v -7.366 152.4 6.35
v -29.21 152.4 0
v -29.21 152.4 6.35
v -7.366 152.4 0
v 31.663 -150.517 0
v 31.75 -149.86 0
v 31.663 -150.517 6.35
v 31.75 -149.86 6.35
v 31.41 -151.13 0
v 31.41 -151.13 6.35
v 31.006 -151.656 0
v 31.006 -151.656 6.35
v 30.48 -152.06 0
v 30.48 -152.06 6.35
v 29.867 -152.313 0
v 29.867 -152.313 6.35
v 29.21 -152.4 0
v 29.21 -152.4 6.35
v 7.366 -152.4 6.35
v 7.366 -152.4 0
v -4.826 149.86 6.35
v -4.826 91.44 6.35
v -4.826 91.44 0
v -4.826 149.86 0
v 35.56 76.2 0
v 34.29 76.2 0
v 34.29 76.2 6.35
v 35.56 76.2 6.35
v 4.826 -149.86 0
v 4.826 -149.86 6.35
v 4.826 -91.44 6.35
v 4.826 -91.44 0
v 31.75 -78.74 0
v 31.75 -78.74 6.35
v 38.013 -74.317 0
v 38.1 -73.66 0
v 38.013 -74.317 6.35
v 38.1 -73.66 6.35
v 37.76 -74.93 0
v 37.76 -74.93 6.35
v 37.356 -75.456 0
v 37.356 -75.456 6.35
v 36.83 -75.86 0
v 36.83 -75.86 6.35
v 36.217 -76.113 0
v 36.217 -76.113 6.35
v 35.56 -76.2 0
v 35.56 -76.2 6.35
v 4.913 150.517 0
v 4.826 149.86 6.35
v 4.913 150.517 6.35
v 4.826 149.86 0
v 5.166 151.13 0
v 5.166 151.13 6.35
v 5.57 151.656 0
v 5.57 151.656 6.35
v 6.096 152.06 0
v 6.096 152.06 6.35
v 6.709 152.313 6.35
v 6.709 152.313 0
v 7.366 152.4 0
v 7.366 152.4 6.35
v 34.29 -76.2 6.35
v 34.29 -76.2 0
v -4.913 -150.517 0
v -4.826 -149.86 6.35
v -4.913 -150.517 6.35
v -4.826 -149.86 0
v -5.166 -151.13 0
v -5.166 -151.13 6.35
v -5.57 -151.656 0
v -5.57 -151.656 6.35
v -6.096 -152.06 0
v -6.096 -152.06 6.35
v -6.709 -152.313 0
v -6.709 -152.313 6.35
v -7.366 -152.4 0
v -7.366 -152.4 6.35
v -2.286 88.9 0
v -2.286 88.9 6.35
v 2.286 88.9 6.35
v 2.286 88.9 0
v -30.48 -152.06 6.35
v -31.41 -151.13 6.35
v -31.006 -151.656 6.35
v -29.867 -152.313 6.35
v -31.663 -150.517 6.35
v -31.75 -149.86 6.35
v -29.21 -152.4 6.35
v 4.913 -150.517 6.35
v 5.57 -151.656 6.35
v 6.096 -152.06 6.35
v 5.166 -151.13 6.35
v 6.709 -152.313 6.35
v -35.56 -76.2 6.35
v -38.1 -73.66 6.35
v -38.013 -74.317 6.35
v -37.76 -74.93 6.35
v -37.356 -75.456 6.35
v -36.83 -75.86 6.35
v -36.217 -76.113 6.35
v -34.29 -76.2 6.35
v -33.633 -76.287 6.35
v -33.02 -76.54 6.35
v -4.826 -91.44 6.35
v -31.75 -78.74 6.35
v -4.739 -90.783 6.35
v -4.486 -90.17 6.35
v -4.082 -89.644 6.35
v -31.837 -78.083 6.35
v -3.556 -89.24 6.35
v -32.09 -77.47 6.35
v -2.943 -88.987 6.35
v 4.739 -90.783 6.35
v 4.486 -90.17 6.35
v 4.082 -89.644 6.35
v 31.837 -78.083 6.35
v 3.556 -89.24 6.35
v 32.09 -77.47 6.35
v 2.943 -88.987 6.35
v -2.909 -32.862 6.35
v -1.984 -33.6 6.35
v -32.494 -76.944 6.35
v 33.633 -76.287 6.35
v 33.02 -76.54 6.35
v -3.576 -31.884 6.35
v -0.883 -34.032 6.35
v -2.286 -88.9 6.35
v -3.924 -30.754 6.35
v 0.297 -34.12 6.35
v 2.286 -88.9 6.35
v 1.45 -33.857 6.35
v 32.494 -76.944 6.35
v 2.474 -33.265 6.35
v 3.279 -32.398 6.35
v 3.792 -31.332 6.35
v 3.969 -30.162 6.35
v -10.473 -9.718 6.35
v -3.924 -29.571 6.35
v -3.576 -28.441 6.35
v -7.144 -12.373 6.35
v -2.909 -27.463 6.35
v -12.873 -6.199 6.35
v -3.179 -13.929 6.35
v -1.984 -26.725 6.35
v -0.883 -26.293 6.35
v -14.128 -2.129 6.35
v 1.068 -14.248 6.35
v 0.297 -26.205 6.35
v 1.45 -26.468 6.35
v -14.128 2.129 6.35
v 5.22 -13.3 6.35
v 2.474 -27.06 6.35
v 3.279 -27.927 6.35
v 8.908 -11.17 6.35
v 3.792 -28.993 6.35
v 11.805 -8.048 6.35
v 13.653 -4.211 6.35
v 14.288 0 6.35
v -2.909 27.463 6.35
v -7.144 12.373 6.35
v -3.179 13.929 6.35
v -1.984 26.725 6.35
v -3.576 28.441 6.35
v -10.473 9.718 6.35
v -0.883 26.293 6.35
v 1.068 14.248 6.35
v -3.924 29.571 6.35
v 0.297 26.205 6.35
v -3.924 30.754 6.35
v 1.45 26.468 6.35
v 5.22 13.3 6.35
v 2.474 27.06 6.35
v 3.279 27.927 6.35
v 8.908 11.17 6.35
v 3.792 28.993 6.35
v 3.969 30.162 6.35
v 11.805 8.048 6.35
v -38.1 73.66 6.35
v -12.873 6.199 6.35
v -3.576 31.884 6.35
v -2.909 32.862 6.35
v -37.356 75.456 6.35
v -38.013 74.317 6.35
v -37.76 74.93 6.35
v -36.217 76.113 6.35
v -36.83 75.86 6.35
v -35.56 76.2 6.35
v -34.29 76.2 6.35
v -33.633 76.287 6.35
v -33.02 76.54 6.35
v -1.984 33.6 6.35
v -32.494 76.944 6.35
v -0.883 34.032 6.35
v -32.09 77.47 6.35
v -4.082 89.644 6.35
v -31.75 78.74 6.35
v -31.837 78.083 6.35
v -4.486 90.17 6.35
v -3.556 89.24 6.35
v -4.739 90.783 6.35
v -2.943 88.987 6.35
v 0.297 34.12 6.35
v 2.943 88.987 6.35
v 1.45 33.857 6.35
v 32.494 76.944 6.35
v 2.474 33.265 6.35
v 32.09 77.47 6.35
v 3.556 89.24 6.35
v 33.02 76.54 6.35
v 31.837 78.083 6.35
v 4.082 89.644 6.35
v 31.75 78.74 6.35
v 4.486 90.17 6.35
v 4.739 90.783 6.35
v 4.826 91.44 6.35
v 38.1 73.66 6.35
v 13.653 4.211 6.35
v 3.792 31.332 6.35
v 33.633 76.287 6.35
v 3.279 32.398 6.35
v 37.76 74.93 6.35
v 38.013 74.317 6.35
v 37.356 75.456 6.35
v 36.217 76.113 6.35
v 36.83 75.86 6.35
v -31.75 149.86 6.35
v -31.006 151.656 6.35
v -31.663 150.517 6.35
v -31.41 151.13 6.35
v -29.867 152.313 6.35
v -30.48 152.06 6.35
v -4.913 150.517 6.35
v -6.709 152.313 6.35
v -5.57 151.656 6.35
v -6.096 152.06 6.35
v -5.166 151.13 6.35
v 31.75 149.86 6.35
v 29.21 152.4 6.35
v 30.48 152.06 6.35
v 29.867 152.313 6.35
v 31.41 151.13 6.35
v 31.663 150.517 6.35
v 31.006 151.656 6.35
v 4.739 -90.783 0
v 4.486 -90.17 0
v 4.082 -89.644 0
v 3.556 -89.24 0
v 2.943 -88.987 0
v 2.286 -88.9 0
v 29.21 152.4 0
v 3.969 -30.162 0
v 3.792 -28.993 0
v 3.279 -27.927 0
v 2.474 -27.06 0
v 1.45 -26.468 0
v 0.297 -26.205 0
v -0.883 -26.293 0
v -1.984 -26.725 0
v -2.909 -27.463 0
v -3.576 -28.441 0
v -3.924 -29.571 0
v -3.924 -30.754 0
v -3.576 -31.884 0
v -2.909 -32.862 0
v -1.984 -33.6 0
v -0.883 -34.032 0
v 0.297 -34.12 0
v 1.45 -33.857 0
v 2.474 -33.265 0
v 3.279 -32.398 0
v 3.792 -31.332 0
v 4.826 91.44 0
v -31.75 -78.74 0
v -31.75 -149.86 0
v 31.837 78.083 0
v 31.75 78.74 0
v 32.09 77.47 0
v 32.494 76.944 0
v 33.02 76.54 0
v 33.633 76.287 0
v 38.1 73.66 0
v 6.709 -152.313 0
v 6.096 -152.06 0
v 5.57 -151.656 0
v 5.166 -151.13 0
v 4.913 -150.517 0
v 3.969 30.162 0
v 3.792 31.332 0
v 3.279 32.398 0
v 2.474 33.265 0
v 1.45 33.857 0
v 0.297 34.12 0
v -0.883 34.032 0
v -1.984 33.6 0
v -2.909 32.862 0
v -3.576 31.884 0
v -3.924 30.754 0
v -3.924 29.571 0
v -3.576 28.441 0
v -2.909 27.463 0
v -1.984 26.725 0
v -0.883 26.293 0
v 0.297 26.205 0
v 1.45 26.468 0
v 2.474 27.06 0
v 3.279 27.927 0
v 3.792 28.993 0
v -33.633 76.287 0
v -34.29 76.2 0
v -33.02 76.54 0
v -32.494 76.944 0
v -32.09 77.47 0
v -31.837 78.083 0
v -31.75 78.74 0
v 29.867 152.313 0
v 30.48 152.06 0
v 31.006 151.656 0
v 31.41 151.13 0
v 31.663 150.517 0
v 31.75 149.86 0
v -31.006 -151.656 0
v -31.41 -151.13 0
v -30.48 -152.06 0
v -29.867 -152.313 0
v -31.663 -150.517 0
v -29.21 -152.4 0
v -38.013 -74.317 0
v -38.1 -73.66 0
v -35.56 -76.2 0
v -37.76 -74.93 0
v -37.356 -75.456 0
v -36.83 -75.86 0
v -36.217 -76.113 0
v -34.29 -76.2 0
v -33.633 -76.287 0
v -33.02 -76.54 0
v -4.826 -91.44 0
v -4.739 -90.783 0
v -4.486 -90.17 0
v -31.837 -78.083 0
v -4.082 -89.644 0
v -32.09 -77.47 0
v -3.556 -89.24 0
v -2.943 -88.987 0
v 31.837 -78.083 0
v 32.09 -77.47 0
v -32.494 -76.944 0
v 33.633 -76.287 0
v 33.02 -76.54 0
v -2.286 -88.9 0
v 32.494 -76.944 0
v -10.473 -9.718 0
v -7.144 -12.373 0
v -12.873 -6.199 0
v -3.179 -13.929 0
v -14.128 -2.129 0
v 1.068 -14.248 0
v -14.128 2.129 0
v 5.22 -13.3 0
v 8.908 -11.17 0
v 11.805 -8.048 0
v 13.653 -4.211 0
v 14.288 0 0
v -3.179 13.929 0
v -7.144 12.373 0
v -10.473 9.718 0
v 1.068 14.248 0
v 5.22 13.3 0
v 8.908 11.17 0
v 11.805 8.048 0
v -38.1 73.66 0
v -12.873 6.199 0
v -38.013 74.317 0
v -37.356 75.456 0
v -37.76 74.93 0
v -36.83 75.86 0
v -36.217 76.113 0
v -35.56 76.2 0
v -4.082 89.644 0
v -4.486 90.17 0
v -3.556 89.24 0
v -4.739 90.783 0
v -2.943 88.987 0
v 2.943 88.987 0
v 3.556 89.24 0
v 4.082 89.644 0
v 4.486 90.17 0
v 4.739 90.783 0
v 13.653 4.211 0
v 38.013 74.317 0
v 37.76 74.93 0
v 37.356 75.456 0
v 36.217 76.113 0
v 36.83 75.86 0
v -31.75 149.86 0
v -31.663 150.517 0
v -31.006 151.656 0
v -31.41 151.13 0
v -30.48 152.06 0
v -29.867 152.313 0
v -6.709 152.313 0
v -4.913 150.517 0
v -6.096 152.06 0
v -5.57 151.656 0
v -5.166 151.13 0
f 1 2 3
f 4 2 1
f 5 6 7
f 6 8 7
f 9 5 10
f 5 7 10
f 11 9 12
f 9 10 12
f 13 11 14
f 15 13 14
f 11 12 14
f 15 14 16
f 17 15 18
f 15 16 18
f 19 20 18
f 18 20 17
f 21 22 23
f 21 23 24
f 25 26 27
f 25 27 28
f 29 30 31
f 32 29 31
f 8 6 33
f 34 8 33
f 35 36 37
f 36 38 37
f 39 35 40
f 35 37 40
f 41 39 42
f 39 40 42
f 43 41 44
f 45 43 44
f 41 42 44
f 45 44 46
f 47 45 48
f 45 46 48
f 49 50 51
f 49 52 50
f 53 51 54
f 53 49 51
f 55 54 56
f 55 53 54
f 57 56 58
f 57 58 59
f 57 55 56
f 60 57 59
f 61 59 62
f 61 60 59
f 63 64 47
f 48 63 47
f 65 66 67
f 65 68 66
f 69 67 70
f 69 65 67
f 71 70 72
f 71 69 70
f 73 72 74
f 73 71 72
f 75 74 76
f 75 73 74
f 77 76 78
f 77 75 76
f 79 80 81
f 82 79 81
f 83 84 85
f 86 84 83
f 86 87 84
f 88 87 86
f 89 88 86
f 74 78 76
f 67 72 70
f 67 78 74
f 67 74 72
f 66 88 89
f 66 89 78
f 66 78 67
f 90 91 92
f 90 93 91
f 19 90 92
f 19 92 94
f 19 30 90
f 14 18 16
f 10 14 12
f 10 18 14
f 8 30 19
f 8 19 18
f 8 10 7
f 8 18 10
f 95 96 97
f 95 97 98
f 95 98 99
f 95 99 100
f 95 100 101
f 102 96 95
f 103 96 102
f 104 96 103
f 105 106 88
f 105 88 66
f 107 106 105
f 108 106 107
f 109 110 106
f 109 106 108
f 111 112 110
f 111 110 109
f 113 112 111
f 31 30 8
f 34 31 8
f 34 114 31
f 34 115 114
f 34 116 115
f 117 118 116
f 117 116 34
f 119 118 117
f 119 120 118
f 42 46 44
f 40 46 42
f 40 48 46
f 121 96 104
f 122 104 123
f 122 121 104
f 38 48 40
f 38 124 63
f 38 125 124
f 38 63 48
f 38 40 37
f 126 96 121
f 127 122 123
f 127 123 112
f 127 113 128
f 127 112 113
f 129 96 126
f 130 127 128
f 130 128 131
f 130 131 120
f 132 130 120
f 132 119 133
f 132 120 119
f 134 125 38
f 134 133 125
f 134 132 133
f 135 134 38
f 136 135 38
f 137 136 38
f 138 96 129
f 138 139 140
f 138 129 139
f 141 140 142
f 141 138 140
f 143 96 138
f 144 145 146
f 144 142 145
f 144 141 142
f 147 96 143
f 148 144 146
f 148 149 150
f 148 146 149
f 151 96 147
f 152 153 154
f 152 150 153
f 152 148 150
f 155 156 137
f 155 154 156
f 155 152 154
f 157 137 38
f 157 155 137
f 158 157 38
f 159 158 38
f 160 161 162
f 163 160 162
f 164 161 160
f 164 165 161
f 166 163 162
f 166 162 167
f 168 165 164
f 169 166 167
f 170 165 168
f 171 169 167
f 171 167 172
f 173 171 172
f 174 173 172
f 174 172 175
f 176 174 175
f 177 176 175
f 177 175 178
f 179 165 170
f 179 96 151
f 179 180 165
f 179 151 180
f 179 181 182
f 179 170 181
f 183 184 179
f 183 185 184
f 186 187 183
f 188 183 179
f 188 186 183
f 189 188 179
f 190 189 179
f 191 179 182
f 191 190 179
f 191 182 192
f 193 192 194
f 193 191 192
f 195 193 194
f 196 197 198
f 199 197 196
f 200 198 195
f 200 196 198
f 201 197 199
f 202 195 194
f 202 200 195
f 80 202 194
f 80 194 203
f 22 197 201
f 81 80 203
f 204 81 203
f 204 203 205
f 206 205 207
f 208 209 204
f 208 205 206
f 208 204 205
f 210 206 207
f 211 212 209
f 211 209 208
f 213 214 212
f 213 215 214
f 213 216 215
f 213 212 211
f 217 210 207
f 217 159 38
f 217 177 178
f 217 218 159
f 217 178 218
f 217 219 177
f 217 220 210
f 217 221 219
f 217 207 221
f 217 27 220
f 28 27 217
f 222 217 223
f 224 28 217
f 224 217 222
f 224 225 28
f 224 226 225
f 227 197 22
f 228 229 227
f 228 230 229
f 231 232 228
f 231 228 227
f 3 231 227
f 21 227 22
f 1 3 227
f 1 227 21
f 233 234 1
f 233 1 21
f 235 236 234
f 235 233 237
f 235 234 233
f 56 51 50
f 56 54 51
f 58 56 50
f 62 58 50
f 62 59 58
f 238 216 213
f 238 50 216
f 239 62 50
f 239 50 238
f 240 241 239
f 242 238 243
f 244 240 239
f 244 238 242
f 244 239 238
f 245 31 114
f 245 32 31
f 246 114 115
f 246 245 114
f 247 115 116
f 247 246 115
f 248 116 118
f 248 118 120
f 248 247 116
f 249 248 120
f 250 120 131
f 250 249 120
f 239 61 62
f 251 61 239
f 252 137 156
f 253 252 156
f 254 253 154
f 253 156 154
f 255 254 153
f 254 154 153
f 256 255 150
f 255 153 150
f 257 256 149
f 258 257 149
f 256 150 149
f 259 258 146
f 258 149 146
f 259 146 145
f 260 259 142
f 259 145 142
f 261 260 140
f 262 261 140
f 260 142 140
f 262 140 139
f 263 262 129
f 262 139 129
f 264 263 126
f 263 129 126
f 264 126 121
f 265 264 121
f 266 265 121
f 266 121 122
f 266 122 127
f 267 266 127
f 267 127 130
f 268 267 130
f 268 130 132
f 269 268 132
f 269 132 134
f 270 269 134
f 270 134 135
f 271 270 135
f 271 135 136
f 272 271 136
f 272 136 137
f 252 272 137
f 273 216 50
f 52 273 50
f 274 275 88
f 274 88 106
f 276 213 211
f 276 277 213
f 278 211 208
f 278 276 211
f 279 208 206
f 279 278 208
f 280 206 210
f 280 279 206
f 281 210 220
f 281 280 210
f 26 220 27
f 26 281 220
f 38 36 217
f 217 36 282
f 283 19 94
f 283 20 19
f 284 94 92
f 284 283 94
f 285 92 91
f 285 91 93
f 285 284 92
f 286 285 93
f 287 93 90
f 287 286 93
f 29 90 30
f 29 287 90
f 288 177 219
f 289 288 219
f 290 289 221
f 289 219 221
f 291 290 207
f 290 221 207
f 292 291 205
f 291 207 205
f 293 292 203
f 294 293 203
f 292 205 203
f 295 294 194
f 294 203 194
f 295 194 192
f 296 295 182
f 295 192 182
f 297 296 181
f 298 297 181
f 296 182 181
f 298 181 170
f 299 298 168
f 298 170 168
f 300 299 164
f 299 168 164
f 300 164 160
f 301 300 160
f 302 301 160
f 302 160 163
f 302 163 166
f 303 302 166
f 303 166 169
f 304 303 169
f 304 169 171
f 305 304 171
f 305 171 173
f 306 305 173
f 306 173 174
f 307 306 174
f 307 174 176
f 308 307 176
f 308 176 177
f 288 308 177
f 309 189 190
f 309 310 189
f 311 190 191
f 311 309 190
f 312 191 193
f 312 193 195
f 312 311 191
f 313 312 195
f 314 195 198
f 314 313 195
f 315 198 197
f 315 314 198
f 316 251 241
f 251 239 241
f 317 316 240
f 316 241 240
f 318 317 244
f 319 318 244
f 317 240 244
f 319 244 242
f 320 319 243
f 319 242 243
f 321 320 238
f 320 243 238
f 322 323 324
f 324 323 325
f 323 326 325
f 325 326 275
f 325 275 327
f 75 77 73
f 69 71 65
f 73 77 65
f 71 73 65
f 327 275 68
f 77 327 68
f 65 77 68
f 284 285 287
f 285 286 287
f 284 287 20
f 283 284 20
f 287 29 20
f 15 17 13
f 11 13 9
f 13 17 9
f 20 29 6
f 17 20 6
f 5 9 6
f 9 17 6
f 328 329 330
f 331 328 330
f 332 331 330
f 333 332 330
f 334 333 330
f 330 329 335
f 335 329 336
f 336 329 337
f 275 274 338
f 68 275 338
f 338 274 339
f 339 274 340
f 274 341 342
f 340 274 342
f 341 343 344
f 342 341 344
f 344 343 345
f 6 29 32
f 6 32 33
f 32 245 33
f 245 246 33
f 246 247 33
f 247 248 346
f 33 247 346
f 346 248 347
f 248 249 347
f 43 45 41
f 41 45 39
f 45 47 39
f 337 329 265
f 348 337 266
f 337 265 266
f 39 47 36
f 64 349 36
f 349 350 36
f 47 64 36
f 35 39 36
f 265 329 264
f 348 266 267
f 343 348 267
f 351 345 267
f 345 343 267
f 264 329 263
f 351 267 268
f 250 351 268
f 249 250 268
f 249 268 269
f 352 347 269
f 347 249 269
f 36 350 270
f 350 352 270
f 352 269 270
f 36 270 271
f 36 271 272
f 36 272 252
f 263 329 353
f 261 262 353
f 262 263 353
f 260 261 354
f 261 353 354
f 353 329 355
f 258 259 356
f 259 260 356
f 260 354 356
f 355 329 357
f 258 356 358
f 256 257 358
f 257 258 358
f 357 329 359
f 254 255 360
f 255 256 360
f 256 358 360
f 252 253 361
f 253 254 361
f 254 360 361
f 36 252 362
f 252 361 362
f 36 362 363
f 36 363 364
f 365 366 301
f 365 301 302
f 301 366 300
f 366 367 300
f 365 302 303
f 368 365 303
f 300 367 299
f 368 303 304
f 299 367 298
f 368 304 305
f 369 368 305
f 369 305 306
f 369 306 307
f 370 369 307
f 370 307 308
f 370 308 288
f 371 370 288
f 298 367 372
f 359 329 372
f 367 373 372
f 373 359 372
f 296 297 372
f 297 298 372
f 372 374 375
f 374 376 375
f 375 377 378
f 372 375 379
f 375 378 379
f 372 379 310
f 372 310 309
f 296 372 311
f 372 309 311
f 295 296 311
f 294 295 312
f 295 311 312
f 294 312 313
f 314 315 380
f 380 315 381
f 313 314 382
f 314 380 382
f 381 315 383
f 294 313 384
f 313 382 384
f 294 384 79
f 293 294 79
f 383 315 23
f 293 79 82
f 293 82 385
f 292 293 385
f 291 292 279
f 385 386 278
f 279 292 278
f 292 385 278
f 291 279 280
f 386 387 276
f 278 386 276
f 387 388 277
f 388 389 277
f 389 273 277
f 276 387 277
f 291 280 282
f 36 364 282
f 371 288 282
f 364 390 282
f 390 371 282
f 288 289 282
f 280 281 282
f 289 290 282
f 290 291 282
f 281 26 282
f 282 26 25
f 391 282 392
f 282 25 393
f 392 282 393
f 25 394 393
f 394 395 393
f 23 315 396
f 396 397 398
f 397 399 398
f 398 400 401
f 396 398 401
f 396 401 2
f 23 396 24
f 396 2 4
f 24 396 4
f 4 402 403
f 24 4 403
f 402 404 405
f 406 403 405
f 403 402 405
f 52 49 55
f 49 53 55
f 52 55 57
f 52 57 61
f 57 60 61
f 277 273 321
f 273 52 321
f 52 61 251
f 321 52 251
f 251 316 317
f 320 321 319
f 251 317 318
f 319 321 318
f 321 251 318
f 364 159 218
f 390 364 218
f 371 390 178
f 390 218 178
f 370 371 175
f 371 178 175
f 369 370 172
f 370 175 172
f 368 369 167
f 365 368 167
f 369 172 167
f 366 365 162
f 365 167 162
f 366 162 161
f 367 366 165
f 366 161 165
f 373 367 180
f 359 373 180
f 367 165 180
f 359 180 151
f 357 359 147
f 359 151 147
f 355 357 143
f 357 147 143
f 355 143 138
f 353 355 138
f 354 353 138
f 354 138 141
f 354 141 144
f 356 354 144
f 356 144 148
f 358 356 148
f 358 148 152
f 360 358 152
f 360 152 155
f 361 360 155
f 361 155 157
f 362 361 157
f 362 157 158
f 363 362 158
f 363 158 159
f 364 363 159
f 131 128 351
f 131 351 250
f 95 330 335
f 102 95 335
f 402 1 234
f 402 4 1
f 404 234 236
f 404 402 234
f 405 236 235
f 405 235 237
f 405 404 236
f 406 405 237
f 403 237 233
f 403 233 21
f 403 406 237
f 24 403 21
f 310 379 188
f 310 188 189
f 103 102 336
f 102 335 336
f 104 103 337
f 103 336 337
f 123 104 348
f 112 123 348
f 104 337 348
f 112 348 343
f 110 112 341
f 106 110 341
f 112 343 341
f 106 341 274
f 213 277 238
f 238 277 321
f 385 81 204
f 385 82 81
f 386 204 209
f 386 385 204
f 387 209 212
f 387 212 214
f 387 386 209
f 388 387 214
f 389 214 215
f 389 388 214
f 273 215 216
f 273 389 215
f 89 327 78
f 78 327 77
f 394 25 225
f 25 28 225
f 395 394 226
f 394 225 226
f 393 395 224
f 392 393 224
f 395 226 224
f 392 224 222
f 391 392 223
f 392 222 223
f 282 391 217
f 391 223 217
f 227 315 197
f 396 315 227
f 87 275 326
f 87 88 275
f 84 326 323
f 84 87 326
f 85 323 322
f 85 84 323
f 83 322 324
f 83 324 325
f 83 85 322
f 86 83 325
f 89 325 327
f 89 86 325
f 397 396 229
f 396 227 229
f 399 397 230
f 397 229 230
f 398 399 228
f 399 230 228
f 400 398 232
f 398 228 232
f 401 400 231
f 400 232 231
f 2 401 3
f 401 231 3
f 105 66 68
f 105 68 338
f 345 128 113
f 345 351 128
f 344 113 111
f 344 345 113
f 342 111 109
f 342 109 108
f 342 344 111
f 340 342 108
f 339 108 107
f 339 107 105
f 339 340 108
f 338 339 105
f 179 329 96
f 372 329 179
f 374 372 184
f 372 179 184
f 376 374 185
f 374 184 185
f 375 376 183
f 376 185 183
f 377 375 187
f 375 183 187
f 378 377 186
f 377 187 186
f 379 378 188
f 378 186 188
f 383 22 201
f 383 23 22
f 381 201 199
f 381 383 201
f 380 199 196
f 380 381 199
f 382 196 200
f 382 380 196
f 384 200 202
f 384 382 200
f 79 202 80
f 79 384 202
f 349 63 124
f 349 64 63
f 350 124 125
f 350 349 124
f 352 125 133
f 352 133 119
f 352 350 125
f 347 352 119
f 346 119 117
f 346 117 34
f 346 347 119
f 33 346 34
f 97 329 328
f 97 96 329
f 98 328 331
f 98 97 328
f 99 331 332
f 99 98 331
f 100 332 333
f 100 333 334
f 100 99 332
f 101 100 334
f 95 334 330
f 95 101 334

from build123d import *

# Parameters (mm, degrees)
F0_W     = 63.5
F0_H     = 304.8
F1_DEPTH = 6.35
F2_W     = 76.2
F2_H     = 152.4
F3_DEPTH = 6.35
F4_W     = 9.652
F4_H     = 63.5
F4_R     = 14.2875
F4_R_2   = 3.96875
F5_DEPTH = 6.351
F6_R     = 2.54


with BuildPart() as f1:
    # F0 (on Top) → F1 (new body)
    with BuildSketch(Plane.XY):
        Rectangle(F0_W, F0_H)
    extrude(amount=F1_DEPTH)

    # F2 (on Top) → F3 (join)
    with BuildSketch(Plane.XY):
        Rectangle(F2_W, F2_H)
    extrude(amount=F3_DEPTH)

    # F4 (on face) → F5 (cut, through all)
    with BuildSketch(Plane.XY.offset(6.35)):
        with Locations((0, 120.65)):
            Rectangle(F4_W, F4_H)
        with Locations((0, -120.65)):
            Rectangle(F4_W, F4_H)
        Circle(F4_R)
        with Locations((0, 30.1625)):
            Circle(F4_R_2)
        with Locations((0, -30.1625)):
            Circle(F4_R_2)
    extrude(amount=-F5_DEPTH, mode=Mode.SUBTRACT)

    # F6
    f6_edges = [f1.edges().sort_by_distance(p)[0] for p in [
        (-38.1, 76.2, 3.175),
        (-31.75, 76.2, 3.175),
        (-31.75, 152.4, 3.175),
        (-4.826, 152.4, 3.175),
        (4.826, 152.4, 3.175),
        (4.826, 88.9, 3.175),
        (-4.826, 88.9, 3.175),
        (31.75, 152.4, 3.175),
        (31.75, 76.2, 3.175),
        (38.1, 76.2, 3.175),
        (38.1, -76.2, 3.175),
        (31.75, -76.2, 3.175),
        (31.75, -152.4, 3.175),
        (4.826, -152.4, 3.175),
        (4.826, -88.9, 3.175),
        (-4.826, -88.9, 3.175),
        (-4.826, -152.4, 3.175),
        (-31.75, -152.4, 3.175),
        (-31.75, -76.2, 3.175),
        (-38.1, -76.2, 3.175),
    ]]
    fillet(f6_edges, radius=F6_R)


solid = f1.part
